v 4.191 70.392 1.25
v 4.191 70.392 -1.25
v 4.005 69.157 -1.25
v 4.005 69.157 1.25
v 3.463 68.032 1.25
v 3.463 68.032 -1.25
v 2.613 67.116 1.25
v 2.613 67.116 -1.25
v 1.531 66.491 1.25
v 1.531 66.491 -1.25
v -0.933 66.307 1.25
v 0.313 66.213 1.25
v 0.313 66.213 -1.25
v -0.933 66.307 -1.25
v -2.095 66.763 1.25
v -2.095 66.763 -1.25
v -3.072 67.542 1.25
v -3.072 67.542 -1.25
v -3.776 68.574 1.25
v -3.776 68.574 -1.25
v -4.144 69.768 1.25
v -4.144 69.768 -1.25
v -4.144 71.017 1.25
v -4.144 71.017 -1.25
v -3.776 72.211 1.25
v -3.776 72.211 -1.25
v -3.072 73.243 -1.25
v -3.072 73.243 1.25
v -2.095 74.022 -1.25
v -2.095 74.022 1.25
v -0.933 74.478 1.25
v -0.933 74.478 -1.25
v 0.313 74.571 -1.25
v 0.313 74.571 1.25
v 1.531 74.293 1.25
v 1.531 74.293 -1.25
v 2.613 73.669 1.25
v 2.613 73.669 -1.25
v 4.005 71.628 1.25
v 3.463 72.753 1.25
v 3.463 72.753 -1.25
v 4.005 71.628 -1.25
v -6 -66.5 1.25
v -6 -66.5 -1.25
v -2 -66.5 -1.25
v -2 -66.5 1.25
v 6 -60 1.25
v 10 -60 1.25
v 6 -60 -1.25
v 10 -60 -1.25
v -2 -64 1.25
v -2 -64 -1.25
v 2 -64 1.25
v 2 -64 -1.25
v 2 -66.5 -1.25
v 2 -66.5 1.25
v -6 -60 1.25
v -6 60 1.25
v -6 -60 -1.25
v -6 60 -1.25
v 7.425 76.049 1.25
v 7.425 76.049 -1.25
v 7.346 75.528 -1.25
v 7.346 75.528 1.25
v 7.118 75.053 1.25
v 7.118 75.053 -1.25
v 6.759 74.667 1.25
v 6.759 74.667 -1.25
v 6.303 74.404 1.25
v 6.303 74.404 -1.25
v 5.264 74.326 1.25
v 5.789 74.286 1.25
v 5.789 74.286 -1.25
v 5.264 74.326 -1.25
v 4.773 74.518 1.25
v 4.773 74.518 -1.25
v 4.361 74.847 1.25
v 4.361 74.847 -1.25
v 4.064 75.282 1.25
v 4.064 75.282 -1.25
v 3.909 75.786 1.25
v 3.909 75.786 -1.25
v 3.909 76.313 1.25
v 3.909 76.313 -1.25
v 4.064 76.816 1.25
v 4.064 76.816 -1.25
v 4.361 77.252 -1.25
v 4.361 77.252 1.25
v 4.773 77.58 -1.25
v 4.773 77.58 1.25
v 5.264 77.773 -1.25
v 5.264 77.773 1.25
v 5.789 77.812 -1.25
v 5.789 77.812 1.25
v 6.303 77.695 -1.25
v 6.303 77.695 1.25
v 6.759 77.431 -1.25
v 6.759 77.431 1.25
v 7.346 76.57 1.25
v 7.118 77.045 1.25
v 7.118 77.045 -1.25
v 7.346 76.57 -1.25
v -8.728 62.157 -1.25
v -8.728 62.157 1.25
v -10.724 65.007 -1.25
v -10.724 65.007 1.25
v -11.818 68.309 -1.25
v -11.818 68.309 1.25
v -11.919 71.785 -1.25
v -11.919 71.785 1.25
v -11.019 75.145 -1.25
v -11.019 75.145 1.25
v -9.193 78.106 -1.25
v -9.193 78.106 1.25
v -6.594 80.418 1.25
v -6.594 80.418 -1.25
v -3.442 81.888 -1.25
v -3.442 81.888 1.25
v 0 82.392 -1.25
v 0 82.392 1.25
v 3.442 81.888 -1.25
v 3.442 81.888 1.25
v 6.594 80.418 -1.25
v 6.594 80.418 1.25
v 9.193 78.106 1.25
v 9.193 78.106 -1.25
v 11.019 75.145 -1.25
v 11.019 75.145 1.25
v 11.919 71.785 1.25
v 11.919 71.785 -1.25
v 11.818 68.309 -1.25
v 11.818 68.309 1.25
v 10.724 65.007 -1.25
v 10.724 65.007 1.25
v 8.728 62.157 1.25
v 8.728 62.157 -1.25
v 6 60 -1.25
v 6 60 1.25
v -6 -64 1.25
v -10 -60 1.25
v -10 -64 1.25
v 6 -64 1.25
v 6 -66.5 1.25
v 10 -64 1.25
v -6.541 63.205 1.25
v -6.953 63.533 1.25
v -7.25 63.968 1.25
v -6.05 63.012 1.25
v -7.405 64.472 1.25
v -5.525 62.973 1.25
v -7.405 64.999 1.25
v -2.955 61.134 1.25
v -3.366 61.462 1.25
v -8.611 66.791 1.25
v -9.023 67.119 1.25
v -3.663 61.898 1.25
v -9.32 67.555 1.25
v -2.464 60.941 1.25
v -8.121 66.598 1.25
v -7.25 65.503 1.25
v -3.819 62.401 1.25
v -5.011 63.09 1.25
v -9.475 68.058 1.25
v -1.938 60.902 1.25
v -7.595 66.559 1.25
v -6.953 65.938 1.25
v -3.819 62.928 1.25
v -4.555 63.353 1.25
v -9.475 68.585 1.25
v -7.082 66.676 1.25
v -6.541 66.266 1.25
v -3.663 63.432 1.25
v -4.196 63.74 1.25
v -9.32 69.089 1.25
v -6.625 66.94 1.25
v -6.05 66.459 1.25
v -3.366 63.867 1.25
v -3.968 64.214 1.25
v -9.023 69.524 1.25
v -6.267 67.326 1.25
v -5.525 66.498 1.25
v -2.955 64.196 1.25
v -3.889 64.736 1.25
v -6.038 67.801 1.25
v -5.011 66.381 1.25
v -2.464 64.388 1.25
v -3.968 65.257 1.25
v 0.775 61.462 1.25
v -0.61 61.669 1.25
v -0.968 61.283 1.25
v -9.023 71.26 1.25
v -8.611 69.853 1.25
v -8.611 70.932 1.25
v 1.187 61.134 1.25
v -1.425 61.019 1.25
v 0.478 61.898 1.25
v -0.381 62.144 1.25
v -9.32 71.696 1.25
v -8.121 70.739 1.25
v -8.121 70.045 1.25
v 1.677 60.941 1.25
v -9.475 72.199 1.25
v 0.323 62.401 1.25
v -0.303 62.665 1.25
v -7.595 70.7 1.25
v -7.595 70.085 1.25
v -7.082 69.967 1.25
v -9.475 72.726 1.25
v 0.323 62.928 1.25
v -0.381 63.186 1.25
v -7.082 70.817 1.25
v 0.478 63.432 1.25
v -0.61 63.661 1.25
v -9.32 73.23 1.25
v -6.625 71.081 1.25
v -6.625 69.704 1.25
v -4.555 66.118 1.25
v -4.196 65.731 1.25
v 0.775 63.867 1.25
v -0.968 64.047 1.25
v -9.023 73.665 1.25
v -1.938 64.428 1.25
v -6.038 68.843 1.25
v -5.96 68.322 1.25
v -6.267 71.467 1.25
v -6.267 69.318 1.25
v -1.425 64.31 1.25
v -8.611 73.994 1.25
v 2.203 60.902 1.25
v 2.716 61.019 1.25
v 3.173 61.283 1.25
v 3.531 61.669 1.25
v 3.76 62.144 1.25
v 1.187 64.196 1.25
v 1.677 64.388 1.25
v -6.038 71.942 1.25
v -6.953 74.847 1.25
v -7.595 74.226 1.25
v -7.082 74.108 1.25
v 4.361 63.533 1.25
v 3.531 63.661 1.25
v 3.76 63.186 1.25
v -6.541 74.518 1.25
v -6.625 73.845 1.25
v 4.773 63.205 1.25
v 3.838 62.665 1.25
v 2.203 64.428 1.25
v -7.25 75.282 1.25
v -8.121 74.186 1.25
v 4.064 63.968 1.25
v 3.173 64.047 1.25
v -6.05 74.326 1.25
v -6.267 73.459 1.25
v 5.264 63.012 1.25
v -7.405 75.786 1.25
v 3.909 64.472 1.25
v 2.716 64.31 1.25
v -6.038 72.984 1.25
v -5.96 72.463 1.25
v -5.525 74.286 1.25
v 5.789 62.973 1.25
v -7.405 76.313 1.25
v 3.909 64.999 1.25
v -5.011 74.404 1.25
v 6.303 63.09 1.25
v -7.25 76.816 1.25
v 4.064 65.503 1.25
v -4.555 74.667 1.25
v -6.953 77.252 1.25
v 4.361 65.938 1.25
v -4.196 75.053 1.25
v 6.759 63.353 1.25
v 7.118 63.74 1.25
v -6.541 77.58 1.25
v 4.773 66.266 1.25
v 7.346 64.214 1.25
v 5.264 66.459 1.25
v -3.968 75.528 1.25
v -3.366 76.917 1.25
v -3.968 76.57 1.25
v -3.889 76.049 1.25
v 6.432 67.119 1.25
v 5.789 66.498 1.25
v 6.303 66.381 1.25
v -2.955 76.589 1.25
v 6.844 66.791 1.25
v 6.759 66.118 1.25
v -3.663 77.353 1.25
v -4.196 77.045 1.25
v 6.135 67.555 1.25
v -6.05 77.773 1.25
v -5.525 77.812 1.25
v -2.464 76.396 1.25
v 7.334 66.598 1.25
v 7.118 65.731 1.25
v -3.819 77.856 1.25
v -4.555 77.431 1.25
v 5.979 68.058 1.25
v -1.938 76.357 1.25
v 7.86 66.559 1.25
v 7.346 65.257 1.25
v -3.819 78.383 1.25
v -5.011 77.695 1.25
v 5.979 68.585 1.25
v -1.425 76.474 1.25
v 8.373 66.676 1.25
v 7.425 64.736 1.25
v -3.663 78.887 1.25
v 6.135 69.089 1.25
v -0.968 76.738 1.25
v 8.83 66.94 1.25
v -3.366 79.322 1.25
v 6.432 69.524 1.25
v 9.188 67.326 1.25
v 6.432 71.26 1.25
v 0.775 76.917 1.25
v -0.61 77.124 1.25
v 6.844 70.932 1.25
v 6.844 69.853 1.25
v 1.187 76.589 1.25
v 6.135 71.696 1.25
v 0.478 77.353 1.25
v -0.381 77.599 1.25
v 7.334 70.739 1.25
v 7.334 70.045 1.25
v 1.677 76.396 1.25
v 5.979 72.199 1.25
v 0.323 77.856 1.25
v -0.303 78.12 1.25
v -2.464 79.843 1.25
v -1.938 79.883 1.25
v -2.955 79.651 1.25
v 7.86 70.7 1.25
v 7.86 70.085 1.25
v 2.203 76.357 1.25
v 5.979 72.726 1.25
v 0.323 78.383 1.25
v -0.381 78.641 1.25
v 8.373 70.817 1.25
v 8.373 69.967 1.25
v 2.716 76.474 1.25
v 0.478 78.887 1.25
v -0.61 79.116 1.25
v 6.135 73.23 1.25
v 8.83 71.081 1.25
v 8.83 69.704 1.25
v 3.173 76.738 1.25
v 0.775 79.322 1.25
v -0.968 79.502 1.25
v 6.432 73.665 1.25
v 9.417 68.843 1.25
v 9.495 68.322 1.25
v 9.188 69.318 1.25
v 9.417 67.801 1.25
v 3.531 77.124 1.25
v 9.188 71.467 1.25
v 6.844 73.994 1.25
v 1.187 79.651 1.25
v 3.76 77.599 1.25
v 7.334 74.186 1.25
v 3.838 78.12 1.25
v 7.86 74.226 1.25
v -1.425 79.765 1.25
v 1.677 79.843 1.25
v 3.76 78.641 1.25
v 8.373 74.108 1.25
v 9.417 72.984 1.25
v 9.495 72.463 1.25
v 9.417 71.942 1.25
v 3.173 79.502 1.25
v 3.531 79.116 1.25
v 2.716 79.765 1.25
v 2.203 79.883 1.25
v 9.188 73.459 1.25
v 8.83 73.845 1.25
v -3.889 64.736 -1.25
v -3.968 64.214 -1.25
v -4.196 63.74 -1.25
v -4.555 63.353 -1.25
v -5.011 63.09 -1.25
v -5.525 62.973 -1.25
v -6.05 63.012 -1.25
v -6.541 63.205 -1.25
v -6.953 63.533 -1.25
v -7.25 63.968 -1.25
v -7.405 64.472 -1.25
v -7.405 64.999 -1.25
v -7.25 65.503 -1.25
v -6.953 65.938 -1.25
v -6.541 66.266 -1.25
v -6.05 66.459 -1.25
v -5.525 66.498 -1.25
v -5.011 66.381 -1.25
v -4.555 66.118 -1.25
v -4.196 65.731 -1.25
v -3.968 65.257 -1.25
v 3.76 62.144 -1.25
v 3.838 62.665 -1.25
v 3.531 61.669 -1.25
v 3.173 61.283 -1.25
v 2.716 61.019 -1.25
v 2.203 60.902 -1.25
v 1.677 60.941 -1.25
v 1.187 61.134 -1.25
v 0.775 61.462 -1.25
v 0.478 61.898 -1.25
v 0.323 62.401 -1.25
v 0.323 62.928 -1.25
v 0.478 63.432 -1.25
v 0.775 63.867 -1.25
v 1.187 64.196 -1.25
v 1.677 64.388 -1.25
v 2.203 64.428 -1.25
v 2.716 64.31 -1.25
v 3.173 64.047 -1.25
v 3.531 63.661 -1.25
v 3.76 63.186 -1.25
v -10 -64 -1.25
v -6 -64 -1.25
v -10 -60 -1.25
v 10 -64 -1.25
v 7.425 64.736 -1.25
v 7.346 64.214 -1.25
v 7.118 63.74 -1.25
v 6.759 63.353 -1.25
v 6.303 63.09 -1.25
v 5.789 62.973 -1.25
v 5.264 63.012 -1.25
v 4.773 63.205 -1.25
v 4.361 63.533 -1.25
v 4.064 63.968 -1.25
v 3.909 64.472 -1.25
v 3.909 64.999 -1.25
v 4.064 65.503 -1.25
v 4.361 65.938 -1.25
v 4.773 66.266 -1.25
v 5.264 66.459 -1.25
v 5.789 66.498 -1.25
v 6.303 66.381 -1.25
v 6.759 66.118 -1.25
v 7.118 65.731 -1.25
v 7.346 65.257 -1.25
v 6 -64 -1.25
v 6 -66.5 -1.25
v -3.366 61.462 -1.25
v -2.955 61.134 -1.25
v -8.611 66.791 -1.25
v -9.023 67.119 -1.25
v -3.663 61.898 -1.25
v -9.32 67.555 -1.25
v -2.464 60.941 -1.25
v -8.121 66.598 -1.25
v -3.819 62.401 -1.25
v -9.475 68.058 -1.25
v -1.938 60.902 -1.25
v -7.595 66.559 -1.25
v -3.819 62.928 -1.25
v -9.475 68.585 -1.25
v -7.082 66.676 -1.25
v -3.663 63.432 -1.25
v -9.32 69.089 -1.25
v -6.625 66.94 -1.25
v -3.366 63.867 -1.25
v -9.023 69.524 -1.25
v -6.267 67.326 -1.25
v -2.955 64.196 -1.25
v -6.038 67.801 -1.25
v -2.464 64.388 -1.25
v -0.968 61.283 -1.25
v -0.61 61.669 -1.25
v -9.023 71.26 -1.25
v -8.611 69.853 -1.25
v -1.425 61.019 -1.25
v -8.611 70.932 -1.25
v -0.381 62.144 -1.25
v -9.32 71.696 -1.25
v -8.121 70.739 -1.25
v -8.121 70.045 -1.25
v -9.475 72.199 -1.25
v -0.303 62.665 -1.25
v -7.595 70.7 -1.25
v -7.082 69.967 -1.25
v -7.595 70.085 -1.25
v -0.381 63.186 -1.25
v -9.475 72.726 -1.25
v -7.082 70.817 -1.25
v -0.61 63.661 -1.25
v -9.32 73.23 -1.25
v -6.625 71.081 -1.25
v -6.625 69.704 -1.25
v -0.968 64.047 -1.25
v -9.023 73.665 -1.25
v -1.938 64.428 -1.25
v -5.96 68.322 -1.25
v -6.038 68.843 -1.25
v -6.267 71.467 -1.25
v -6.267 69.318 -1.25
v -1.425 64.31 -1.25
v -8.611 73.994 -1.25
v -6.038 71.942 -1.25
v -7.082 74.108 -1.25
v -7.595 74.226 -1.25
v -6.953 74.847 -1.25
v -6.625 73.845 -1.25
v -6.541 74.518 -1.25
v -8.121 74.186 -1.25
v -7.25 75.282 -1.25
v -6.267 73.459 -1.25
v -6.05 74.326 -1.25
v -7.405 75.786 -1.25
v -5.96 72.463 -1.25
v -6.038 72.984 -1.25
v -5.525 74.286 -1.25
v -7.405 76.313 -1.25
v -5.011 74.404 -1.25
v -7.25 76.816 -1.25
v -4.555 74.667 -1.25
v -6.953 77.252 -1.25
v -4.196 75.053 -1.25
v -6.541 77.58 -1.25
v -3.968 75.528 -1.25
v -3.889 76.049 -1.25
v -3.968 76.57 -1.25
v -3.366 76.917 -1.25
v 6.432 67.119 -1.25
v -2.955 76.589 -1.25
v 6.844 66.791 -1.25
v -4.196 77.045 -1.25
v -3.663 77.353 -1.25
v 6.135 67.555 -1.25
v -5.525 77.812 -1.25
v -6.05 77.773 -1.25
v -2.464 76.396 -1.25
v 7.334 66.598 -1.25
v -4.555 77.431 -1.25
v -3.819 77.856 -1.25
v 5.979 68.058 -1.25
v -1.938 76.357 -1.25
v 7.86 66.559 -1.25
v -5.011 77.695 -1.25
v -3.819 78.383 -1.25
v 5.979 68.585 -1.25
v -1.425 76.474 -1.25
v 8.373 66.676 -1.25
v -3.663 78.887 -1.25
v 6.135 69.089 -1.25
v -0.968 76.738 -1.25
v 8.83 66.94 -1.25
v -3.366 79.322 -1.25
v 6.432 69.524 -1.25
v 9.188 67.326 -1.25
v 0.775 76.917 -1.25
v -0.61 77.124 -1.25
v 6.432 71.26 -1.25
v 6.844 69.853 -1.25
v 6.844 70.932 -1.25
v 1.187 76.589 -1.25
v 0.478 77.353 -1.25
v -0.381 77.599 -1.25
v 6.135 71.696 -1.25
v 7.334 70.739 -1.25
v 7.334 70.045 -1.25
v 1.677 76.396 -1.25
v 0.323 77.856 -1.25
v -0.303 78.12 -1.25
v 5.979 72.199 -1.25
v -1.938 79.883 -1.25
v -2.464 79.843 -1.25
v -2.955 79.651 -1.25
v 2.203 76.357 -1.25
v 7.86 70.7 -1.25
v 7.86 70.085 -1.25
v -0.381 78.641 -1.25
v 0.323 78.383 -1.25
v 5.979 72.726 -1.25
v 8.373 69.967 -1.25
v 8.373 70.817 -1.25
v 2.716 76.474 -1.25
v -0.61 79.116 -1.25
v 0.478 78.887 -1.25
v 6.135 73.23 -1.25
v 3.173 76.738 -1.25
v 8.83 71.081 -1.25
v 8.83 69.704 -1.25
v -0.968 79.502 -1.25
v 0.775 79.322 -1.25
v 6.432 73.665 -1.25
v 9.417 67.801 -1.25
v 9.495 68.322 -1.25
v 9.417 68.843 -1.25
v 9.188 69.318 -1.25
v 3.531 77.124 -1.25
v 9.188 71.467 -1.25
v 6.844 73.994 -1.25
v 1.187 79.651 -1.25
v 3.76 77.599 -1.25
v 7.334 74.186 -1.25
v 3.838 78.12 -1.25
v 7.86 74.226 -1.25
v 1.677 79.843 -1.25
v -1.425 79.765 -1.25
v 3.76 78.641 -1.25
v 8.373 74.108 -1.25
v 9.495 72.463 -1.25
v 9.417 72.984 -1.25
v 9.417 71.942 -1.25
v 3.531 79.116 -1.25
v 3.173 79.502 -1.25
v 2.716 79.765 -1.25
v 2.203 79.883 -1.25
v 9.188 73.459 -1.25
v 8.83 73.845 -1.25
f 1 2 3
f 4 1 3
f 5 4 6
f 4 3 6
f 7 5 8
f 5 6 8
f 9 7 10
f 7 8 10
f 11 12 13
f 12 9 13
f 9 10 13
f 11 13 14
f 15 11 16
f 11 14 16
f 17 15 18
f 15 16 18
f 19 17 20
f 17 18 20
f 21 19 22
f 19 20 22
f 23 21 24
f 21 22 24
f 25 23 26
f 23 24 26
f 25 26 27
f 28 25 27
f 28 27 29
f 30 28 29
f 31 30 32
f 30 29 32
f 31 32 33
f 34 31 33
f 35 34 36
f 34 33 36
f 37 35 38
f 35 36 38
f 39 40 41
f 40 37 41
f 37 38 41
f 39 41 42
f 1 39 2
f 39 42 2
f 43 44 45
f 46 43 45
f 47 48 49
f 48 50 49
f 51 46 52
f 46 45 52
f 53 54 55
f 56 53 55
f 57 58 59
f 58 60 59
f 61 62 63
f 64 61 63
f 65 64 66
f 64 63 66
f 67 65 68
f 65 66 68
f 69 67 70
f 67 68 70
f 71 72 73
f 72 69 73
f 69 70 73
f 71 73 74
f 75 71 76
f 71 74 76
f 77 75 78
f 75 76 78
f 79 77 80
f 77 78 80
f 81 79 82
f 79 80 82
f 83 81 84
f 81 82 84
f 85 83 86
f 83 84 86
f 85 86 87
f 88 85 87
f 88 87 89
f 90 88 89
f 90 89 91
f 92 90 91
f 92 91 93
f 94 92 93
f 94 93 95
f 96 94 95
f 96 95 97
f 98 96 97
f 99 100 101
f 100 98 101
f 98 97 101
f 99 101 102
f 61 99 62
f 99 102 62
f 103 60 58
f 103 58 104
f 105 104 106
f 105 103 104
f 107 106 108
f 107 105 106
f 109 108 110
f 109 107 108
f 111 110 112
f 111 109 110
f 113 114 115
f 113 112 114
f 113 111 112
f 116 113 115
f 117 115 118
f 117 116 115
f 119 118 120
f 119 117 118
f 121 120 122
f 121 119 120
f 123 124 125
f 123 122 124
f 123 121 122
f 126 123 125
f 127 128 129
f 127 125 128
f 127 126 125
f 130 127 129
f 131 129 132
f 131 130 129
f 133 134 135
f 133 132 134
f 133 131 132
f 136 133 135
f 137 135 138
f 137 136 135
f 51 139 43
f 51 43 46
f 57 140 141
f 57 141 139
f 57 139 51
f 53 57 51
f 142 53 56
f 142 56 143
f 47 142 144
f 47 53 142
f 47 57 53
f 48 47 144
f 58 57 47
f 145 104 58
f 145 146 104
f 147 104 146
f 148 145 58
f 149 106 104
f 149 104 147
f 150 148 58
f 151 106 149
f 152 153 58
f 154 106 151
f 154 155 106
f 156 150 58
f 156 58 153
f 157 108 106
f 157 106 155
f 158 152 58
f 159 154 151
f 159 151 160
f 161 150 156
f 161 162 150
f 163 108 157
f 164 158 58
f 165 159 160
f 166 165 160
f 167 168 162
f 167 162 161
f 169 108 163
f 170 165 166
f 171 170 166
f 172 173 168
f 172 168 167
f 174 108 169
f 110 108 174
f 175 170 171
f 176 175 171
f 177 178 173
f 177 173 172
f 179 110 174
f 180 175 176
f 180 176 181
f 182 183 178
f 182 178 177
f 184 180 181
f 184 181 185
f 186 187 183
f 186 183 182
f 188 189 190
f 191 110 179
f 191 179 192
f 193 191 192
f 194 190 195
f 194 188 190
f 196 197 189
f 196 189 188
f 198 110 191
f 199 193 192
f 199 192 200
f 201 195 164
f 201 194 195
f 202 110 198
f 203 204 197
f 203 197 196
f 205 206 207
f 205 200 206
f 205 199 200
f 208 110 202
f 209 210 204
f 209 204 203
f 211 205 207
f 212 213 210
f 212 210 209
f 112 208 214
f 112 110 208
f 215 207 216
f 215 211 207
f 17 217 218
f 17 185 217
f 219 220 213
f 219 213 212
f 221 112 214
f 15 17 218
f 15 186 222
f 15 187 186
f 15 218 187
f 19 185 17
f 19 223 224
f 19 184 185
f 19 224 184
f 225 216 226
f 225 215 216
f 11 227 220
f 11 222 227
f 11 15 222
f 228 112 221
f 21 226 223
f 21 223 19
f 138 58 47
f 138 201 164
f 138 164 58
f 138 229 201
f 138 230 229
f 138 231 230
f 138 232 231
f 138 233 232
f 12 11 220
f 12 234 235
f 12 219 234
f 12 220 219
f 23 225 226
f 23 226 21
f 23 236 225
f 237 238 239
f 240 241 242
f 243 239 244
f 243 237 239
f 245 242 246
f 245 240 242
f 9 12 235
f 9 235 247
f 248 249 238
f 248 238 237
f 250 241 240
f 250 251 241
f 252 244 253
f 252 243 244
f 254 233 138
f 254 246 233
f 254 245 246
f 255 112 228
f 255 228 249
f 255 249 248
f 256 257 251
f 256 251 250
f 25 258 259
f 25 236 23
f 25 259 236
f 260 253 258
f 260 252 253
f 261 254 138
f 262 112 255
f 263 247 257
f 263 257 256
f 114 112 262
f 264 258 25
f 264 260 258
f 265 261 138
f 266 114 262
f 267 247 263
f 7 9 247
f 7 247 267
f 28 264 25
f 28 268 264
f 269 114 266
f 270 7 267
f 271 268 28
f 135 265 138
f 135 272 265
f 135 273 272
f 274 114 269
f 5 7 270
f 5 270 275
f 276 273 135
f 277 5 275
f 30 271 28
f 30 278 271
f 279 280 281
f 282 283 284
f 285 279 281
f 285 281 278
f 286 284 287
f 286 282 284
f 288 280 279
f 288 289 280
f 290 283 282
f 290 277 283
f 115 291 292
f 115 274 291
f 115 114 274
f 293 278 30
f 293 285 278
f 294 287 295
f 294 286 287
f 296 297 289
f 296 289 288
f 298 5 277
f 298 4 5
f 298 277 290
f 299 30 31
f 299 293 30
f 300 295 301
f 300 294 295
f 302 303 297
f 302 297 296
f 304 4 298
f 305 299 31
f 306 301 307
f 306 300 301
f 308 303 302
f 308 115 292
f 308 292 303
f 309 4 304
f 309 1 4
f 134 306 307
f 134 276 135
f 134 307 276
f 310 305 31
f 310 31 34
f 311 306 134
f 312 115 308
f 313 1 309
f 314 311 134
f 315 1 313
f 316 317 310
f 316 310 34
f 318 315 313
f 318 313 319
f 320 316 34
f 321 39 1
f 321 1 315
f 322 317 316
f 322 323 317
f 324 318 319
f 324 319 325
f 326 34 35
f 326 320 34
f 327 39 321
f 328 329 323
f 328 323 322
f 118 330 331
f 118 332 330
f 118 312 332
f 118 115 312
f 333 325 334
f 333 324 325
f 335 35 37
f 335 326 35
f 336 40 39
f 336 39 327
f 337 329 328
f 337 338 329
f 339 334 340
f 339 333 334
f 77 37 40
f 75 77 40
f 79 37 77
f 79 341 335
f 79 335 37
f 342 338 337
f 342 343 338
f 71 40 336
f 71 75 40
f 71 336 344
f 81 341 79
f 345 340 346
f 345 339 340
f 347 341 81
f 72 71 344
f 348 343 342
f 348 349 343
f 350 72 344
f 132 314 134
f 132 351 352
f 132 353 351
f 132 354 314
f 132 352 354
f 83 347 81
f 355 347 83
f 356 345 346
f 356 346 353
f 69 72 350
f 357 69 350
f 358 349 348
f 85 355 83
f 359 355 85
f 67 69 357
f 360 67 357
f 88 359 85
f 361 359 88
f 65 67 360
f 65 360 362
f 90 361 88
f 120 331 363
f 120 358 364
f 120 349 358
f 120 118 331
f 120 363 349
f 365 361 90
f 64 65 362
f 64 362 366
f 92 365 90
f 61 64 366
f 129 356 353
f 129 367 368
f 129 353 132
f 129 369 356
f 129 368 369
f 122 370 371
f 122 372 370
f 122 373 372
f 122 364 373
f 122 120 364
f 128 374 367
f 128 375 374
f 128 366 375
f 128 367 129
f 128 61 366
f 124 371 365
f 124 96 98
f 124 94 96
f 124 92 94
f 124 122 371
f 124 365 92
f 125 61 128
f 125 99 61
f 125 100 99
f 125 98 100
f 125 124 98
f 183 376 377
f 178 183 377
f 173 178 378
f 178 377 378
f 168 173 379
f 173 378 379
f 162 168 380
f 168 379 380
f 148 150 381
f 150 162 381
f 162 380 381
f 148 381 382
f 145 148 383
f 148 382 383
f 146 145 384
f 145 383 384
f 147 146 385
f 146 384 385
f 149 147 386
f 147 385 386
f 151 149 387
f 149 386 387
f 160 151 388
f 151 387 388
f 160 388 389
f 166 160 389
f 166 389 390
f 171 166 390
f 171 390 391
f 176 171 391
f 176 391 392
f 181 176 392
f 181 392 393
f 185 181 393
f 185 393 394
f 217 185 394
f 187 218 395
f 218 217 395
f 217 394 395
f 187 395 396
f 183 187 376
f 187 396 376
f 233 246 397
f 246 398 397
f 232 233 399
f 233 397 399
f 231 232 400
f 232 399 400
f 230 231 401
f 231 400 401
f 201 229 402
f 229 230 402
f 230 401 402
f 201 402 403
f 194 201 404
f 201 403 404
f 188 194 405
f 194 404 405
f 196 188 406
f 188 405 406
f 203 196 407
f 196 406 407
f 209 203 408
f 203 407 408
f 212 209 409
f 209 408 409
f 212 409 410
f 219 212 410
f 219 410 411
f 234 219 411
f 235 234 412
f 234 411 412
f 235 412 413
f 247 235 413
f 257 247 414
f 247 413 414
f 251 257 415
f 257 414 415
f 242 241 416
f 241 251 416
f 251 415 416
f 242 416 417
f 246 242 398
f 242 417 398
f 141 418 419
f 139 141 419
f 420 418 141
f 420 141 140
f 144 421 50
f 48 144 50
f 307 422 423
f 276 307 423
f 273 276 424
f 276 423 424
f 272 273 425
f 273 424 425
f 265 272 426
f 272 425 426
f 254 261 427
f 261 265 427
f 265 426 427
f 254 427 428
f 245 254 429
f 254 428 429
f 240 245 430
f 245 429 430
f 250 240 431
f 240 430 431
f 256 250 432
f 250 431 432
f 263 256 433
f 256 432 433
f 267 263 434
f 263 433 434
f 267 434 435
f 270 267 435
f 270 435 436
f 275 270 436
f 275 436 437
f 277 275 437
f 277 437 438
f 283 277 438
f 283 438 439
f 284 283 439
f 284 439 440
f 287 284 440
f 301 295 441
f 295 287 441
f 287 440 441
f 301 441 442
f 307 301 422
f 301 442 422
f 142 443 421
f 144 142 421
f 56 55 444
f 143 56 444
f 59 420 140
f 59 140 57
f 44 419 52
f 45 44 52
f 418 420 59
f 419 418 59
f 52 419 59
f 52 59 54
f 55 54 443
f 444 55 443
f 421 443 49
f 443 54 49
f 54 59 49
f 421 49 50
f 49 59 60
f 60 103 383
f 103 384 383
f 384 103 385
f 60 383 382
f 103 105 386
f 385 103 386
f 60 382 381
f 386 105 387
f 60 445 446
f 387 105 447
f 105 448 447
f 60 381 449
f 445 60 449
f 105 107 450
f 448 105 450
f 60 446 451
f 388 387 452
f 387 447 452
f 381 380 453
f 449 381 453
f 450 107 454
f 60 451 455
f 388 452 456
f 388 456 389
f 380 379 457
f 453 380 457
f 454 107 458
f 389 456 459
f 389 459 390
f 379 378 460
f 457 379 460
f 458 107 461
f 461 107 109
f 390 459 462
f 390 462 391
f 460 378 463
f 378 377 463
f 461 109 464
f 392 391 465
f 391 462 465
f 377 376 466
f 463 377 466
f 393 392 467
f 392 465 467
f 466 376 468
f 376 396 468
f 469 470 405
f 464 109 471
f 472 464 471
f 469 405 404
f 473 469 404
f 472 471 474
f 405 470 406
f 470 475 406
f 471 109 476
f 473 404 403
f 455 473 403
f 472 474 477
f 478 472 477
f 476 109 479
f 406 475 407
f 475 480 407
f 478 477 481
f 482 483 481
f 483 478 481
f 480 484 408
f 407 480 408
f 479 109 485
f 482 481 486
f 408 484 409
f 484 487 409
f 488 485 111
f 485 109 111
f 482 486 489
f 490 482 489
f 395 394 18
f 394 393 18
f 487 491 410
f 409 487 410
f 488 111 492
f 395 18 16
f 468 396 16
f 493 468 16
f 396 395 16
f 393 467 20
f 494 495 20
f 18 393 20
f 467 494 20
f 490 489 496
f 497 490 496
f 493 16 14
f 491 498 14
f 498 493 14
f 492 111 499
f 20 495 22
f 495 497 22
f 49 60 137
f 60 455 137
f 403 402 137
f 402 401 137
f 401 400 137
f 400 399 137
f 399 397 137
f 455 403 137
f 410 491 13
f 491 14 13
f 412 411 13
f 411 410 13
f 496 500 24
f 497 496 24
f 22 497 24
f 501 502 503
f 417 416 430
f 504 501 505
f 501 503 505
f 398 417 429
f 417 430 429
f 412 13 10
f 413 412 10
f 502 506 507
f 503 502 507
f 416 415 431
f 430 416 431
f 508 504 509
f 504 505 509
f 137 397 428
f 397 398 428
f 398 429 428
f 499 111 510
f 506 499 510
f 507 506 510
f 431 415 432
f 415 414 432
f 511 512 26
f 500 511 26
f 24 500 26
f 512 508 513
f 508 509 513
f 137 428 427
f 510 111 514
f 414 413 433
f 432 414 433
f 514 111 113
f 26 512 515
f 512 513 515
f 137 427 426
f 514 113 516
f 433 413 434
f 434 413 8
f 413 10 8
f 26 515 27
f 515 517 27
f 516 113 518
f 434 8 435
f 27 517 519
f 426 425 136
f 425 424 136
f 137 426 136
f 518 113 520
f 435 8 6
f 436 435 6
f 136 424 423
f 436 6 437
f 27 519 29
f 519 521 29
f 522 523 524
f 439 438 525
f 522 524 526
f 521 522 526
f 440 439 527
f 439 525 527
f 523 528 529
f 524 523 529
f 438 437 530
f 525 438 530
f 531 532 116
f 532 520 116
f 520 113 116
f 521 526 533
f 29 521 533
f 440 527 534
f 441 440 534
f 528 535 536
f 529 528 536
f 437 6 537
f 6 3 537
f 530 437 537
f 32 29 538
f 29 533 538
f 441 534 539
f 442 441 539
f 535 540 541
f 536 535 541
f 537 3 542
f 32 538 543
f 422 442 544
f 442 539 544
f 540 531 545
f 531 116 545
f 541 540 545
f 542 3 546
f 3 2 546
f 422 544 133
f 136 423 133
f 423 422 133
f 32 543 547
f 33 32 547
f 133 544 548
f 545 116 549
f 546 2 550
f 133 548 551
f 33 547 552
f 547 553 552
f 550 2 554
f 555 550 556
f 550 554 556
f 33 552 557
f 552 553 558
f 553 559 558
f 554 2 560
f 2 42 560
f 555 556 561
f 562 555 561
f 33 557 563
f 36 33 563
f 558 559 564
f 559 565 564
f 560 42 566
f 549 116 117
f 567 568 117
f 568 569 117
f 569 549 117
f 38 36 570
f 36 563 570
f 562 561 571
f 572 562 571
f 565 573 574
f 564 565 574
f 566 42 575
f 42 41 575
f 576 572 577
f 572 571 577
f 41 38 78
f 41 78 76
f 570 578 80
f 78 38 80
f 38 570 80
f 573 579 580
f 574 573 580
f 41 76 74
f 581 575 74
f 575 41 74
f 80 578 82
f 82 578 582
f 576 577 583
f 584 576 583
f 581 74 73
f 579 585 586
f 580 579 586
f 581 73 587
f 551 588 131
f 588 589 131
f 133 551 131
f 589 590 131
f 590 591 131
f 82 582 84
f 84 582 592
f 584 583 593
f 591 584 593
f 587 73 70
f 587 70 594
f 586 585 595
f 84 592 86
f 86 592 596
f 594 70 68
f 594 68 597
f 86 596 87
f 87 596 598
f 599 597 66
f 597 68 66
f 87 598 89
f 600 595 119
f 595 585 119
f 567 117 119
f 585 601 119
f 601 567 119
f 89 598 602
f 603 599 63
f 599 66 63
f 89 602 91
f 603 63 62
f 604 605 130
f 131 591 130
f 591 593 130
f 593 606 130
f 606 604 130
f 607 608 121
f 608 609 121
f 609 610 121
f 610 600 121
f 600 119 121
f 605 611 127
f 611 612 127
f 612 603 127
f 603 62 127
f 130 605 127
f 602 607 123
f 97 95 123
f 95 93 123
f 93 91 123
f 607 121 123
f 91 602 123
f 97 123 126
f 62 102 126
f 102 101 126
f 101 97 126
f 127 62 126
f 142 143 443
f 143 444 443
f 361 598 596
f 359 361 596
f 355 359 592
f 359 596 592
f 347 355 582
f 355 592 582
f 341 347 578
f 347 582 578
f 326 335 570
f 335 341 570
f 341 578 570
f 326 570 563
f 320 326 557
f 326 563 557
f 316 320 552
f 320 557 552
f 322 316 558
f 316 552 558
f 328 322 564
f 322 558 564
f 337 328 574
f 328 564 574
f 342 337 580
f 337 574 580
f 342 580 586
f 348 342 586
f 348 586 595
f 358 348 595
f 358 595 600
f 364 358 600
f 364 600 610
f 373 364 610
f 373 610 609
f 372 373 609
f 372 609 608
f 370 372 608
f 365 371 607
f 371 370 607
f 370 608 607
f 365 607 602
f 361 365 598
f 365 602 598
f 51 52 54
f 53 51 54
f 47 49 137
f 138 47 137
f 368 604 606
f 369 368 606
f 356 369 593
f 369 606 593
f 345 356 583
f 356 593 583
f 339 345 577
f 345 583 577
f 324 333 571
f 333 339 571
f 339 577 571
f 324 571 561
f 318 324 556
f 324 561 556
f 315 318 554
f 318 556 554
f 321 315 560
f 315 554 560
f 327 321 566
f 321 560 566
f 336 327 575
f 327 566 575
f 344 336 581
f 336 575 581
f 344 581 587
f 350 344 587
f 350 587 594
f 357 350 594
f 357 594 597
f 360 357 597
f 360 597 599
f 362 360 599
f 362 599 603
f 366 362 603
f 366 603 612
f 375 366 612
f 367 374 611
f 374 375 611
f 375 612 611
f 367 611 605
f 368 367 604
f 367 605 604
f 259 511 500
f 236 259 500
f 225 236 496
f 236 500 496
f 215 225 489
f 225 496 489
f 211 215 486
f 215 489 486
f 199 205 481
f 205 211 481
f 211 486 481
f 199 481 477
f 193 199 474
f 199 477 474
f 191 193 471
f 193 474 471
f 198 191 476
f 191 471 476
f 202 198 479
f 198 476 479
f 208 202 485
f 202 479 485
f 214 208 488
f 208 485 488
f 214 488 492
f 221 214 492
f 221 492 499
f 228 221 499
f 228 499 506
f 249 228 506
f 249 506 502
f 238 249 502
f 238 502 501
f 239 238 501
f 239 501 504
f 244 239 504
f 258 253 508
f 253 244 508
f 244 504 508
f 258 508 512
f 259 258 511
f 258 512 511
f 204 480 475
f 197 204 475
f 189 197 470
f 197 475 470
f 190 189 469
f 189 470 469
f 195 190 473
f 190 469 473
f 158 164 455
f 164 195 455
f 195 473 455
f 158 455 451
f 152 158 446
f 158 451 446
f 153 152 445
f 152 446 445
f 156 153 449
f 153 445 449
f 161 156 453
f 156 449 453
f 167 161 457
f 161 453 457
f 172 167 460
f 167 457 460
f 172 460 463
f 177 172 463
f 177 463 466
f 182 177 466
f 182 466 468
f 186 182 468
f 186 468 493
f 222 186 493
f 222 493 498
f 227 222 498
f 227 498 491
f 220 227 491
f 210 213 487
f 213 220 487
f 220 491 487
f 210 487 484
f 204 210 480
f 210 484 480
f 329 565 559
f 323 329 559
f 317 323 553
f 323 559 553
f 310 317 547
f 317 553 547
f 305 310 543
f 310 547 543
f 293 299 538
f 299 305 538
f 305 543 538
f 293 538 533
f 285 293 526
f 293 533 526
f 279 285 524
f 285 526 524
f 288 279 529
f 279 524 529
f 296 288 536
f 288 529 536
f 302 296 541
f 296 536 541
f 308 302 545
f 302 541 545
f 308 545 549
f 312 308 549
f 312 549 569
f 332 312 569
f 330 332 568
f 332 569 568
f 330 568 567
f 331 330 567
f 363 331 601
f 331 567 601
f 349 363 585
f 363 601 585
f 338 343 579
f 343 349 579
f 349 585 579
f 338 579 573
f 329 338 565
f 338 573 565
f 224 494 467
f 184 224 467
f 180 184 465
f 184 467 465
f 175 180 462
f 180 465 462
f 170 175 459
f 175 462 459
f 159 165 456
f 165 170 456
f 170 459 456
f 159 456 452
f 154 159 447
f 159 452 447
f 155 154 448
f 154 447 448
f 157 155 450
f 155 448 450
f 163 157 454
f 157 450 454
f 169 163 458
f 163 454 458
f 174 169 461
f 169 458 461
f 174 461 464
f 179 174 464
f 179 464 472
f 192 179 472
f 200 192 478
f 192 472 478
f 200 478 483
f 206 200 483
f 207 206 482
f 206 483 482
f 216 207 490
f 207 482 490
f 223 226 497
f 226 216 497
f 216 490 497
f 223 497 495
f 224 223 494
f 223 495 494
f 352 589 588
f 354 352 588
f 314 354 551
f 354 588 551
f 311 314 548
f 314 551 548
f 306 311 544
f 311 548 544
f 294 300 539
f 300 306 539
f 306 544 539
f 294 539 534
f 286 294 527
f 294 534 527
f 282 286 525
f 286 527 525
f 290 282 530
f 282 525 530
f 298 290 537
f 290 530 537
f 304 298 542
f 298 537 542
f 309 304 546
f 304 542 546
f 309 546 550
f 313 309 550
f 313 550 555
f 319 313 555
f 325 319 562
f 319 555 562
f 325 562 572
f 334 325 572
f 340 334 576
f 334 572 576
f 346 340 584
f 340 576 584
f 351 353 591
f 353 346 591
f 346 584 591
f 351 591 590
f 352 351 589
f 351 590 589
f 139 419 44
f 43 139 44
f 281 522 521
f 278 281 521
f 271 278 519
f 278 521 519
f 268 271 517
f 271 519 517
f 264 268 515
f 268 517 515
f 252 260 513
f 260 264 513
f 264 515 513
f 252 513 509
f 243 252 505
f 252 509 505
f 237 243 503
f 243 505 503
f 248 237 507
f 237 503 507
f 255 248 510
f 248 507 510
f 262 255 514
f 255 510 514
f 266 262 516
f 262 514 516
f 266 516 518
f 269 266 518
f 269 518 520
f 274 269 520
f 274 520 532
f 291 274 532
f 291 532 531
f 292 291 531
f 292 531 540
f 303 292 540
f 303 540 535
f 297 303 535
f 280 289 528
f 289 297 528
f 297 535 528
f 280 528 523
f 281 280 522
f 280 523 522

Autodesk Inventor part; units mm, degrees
ref_plane "YZ Plane" through (0, 0, 0) normal (1, 0, 0) x (0, 1, 0)
ref_plane "XZ Plane" through (0, 0, 0) normal (0, 1, 0) x (-1, 0, 0)
ref_plane "XY Plane" through (0, 0, 0) normal (0, 0, 1) x (1, 0, 0)
sketch "Sketch1" plane through (0, 0, 0) normal (0, 0, 1) x (1, 0, 0)
  line L0 (-6, 60) -> (-6, -60)
  line L1 (-6, -64) -> (-6, -66.5)
  line L2 (-6, -66.5) -> (-2, -66.5)
  line L3 (-2, -66.5) -> (-2, -64)
  line L4 (-2, -64) -> (2, -64)
  line L5 (2, -64) -> (2, -66.5)
  line L6 (2, -66.5) -> (6, -66.5)
  line L7 (6, -66.5) -> (6, -64)
  line L8 (6, -60) -> (6, 60)
  line L9 (0, 63.1461) -> (0, -63.1461) construction
  line L10 (-16.7969, 0) -> (16.7969, 0) construction
  arc A0 (6, 60) -> (-6, 60) centre (0, 70.3923) ccw
  circle A1 centre (-2.0706, 78.1197) radius 1.7678
  line L11 (-2.0706, 90.8634) -> (-2.0706, 65.376) construction
  line L12 (-3.3097, 78.1197) -> (-0.8314, 78.1197) construction
  line L13 (-3.3206, 79.3697) -> (-0.8206, 79.3697) construction
  line L14 (-0.8206, 79.3697) -> (-0.8206, 76.8697) construction
  line L15 (-0.8206, 76.8697) -> (-3.3206, 76.8697) construction
  line L16 (-3.3206, 76.8697) -> (-3.3206, 79.3697) construction
  circle A2 centre (0, 70.3923) radius 8 construction
  line L17 (10, -64) -> (10, -60)
  line L18 (10, -60) -> (6, -60)
  line L19 (-10, -64) -> (-10, -60)
  line L20 (-10, -60) -> (-6, -60)
  line L21 (-10, -64) -> (-6, -64)
  line L22 (6, -64) -> (10, -64)
  line L23 (0, 70.3923) -> (-4.1411, 85.8471) construction
  circle A3 centre (-5.6569, 76.0492) radius 1.7678
  circle A4 centre (-7.7274, 72.4629) radius 1.7678
  circle A5 centre (-7.7274, 68.3218) radius 1.7678
  circle A6 centre (-5.6569, 64.7355) radius 1.7678
  circle A7 centre (-2.0706, 62.6649) radius 1.7678
  circle A8 centre (2.0706, 62.6649) radius 1.7678
  circle A9 centre (5.6569, 64.7355) radius 1.7678
  circle A10 centre (7.7274, 68.3218) radius 1.7678
  circle A11 centre (7.7274, 72.4629) radius 1.7678
  circle A12 centre (5.6569, 76.0492) radius 1.7678
  circle A13 centre (2.0706, 78.1197) radius 1.7678
  line L24 (-4.2764, 70.3923) -> (4.2764, 70.3923) construction
  line L25 (-4, 71.6423) -> (-1.25, 71.6423) construction
  line L26 (-1.25, 71.6423) -> (-1.25, 74.3923) construction
  line L27 (-1.25, 74.3923) -> (1.25, 74.3923) construction
  line L28 (1.25, 74.3923) -> (1.25, 71.6423) construction
  line L29 (1.25, 71.6423) -> (4, 71.6423) construction
  line L30 (4, 71.6423) -> (4, 69.1423) construction
  line L31 (4, 69.1423) -> (1.25, 69.1423) construction
  line L32 (1.25, 69.1423) -> (1.25, 66.3923) construction
  line L33 (1.25, 66.3923) -> (-1.25, 66.3923) construction
  line L34 (-1.25, 66.3923) -> (-1.25, 69.1423) construction
  line L35 (-1.25, 69.1423) -> (-4, 69.1423) construction
  line L36 (-4, 69.1423) -> (-4, 71.6423) construction
  circle A14 centre (0, 70.3923) radius 4.1908
  circle A15 centre (0, 70.3923) radius 6 construction
  point P0 (0, 0)
  point P1 (0, 0)
  point P2 (-5.1993, 77.7567)
  point P3 (-8.1849, 74.1704)
  point P4 (-8.9774, 69.5718)
  point P5 (-7.3644, 65.193)
  point P6 (-3.7781, 62.2074)
  point P7 (0.8206, 61.4149)
  point P8 (5.1993, 63.0279)
  point P9 (8.1849, 66.6142)
  point P10 (8.9774, 71.2129)
  point P11 (7.3644, 75.5916)
  point P12 (3.7781, 78.5772)
  dimension "d9" = 3.5355
  dimension "d10" = 16
  dimension "d0" = 4
  dimension "d2" = 4
  dimension "d7" = 2.5
  dimension "d8" = 2.5
  dimension "d11" = 24
  dimension "d14" = 4
  dimension "d16" = 4
  dimension "d17" = 12
  dimension "d18" = 20
  dimension "d19" = 2.5
  dimension "d20" = 120
  dimension "d21" = 15
  dimension "d24" = 360
  dimension "d28" = 2.5
  dimension "d29" = 2.5
  dimension "d30" = 8
  dimension "d31" = 8
  dimension "d32" = 12
extrude "Extrusion1" add sketch "Sketch1" along normal mid plane 2.5
properties part number "pitahaya1"
